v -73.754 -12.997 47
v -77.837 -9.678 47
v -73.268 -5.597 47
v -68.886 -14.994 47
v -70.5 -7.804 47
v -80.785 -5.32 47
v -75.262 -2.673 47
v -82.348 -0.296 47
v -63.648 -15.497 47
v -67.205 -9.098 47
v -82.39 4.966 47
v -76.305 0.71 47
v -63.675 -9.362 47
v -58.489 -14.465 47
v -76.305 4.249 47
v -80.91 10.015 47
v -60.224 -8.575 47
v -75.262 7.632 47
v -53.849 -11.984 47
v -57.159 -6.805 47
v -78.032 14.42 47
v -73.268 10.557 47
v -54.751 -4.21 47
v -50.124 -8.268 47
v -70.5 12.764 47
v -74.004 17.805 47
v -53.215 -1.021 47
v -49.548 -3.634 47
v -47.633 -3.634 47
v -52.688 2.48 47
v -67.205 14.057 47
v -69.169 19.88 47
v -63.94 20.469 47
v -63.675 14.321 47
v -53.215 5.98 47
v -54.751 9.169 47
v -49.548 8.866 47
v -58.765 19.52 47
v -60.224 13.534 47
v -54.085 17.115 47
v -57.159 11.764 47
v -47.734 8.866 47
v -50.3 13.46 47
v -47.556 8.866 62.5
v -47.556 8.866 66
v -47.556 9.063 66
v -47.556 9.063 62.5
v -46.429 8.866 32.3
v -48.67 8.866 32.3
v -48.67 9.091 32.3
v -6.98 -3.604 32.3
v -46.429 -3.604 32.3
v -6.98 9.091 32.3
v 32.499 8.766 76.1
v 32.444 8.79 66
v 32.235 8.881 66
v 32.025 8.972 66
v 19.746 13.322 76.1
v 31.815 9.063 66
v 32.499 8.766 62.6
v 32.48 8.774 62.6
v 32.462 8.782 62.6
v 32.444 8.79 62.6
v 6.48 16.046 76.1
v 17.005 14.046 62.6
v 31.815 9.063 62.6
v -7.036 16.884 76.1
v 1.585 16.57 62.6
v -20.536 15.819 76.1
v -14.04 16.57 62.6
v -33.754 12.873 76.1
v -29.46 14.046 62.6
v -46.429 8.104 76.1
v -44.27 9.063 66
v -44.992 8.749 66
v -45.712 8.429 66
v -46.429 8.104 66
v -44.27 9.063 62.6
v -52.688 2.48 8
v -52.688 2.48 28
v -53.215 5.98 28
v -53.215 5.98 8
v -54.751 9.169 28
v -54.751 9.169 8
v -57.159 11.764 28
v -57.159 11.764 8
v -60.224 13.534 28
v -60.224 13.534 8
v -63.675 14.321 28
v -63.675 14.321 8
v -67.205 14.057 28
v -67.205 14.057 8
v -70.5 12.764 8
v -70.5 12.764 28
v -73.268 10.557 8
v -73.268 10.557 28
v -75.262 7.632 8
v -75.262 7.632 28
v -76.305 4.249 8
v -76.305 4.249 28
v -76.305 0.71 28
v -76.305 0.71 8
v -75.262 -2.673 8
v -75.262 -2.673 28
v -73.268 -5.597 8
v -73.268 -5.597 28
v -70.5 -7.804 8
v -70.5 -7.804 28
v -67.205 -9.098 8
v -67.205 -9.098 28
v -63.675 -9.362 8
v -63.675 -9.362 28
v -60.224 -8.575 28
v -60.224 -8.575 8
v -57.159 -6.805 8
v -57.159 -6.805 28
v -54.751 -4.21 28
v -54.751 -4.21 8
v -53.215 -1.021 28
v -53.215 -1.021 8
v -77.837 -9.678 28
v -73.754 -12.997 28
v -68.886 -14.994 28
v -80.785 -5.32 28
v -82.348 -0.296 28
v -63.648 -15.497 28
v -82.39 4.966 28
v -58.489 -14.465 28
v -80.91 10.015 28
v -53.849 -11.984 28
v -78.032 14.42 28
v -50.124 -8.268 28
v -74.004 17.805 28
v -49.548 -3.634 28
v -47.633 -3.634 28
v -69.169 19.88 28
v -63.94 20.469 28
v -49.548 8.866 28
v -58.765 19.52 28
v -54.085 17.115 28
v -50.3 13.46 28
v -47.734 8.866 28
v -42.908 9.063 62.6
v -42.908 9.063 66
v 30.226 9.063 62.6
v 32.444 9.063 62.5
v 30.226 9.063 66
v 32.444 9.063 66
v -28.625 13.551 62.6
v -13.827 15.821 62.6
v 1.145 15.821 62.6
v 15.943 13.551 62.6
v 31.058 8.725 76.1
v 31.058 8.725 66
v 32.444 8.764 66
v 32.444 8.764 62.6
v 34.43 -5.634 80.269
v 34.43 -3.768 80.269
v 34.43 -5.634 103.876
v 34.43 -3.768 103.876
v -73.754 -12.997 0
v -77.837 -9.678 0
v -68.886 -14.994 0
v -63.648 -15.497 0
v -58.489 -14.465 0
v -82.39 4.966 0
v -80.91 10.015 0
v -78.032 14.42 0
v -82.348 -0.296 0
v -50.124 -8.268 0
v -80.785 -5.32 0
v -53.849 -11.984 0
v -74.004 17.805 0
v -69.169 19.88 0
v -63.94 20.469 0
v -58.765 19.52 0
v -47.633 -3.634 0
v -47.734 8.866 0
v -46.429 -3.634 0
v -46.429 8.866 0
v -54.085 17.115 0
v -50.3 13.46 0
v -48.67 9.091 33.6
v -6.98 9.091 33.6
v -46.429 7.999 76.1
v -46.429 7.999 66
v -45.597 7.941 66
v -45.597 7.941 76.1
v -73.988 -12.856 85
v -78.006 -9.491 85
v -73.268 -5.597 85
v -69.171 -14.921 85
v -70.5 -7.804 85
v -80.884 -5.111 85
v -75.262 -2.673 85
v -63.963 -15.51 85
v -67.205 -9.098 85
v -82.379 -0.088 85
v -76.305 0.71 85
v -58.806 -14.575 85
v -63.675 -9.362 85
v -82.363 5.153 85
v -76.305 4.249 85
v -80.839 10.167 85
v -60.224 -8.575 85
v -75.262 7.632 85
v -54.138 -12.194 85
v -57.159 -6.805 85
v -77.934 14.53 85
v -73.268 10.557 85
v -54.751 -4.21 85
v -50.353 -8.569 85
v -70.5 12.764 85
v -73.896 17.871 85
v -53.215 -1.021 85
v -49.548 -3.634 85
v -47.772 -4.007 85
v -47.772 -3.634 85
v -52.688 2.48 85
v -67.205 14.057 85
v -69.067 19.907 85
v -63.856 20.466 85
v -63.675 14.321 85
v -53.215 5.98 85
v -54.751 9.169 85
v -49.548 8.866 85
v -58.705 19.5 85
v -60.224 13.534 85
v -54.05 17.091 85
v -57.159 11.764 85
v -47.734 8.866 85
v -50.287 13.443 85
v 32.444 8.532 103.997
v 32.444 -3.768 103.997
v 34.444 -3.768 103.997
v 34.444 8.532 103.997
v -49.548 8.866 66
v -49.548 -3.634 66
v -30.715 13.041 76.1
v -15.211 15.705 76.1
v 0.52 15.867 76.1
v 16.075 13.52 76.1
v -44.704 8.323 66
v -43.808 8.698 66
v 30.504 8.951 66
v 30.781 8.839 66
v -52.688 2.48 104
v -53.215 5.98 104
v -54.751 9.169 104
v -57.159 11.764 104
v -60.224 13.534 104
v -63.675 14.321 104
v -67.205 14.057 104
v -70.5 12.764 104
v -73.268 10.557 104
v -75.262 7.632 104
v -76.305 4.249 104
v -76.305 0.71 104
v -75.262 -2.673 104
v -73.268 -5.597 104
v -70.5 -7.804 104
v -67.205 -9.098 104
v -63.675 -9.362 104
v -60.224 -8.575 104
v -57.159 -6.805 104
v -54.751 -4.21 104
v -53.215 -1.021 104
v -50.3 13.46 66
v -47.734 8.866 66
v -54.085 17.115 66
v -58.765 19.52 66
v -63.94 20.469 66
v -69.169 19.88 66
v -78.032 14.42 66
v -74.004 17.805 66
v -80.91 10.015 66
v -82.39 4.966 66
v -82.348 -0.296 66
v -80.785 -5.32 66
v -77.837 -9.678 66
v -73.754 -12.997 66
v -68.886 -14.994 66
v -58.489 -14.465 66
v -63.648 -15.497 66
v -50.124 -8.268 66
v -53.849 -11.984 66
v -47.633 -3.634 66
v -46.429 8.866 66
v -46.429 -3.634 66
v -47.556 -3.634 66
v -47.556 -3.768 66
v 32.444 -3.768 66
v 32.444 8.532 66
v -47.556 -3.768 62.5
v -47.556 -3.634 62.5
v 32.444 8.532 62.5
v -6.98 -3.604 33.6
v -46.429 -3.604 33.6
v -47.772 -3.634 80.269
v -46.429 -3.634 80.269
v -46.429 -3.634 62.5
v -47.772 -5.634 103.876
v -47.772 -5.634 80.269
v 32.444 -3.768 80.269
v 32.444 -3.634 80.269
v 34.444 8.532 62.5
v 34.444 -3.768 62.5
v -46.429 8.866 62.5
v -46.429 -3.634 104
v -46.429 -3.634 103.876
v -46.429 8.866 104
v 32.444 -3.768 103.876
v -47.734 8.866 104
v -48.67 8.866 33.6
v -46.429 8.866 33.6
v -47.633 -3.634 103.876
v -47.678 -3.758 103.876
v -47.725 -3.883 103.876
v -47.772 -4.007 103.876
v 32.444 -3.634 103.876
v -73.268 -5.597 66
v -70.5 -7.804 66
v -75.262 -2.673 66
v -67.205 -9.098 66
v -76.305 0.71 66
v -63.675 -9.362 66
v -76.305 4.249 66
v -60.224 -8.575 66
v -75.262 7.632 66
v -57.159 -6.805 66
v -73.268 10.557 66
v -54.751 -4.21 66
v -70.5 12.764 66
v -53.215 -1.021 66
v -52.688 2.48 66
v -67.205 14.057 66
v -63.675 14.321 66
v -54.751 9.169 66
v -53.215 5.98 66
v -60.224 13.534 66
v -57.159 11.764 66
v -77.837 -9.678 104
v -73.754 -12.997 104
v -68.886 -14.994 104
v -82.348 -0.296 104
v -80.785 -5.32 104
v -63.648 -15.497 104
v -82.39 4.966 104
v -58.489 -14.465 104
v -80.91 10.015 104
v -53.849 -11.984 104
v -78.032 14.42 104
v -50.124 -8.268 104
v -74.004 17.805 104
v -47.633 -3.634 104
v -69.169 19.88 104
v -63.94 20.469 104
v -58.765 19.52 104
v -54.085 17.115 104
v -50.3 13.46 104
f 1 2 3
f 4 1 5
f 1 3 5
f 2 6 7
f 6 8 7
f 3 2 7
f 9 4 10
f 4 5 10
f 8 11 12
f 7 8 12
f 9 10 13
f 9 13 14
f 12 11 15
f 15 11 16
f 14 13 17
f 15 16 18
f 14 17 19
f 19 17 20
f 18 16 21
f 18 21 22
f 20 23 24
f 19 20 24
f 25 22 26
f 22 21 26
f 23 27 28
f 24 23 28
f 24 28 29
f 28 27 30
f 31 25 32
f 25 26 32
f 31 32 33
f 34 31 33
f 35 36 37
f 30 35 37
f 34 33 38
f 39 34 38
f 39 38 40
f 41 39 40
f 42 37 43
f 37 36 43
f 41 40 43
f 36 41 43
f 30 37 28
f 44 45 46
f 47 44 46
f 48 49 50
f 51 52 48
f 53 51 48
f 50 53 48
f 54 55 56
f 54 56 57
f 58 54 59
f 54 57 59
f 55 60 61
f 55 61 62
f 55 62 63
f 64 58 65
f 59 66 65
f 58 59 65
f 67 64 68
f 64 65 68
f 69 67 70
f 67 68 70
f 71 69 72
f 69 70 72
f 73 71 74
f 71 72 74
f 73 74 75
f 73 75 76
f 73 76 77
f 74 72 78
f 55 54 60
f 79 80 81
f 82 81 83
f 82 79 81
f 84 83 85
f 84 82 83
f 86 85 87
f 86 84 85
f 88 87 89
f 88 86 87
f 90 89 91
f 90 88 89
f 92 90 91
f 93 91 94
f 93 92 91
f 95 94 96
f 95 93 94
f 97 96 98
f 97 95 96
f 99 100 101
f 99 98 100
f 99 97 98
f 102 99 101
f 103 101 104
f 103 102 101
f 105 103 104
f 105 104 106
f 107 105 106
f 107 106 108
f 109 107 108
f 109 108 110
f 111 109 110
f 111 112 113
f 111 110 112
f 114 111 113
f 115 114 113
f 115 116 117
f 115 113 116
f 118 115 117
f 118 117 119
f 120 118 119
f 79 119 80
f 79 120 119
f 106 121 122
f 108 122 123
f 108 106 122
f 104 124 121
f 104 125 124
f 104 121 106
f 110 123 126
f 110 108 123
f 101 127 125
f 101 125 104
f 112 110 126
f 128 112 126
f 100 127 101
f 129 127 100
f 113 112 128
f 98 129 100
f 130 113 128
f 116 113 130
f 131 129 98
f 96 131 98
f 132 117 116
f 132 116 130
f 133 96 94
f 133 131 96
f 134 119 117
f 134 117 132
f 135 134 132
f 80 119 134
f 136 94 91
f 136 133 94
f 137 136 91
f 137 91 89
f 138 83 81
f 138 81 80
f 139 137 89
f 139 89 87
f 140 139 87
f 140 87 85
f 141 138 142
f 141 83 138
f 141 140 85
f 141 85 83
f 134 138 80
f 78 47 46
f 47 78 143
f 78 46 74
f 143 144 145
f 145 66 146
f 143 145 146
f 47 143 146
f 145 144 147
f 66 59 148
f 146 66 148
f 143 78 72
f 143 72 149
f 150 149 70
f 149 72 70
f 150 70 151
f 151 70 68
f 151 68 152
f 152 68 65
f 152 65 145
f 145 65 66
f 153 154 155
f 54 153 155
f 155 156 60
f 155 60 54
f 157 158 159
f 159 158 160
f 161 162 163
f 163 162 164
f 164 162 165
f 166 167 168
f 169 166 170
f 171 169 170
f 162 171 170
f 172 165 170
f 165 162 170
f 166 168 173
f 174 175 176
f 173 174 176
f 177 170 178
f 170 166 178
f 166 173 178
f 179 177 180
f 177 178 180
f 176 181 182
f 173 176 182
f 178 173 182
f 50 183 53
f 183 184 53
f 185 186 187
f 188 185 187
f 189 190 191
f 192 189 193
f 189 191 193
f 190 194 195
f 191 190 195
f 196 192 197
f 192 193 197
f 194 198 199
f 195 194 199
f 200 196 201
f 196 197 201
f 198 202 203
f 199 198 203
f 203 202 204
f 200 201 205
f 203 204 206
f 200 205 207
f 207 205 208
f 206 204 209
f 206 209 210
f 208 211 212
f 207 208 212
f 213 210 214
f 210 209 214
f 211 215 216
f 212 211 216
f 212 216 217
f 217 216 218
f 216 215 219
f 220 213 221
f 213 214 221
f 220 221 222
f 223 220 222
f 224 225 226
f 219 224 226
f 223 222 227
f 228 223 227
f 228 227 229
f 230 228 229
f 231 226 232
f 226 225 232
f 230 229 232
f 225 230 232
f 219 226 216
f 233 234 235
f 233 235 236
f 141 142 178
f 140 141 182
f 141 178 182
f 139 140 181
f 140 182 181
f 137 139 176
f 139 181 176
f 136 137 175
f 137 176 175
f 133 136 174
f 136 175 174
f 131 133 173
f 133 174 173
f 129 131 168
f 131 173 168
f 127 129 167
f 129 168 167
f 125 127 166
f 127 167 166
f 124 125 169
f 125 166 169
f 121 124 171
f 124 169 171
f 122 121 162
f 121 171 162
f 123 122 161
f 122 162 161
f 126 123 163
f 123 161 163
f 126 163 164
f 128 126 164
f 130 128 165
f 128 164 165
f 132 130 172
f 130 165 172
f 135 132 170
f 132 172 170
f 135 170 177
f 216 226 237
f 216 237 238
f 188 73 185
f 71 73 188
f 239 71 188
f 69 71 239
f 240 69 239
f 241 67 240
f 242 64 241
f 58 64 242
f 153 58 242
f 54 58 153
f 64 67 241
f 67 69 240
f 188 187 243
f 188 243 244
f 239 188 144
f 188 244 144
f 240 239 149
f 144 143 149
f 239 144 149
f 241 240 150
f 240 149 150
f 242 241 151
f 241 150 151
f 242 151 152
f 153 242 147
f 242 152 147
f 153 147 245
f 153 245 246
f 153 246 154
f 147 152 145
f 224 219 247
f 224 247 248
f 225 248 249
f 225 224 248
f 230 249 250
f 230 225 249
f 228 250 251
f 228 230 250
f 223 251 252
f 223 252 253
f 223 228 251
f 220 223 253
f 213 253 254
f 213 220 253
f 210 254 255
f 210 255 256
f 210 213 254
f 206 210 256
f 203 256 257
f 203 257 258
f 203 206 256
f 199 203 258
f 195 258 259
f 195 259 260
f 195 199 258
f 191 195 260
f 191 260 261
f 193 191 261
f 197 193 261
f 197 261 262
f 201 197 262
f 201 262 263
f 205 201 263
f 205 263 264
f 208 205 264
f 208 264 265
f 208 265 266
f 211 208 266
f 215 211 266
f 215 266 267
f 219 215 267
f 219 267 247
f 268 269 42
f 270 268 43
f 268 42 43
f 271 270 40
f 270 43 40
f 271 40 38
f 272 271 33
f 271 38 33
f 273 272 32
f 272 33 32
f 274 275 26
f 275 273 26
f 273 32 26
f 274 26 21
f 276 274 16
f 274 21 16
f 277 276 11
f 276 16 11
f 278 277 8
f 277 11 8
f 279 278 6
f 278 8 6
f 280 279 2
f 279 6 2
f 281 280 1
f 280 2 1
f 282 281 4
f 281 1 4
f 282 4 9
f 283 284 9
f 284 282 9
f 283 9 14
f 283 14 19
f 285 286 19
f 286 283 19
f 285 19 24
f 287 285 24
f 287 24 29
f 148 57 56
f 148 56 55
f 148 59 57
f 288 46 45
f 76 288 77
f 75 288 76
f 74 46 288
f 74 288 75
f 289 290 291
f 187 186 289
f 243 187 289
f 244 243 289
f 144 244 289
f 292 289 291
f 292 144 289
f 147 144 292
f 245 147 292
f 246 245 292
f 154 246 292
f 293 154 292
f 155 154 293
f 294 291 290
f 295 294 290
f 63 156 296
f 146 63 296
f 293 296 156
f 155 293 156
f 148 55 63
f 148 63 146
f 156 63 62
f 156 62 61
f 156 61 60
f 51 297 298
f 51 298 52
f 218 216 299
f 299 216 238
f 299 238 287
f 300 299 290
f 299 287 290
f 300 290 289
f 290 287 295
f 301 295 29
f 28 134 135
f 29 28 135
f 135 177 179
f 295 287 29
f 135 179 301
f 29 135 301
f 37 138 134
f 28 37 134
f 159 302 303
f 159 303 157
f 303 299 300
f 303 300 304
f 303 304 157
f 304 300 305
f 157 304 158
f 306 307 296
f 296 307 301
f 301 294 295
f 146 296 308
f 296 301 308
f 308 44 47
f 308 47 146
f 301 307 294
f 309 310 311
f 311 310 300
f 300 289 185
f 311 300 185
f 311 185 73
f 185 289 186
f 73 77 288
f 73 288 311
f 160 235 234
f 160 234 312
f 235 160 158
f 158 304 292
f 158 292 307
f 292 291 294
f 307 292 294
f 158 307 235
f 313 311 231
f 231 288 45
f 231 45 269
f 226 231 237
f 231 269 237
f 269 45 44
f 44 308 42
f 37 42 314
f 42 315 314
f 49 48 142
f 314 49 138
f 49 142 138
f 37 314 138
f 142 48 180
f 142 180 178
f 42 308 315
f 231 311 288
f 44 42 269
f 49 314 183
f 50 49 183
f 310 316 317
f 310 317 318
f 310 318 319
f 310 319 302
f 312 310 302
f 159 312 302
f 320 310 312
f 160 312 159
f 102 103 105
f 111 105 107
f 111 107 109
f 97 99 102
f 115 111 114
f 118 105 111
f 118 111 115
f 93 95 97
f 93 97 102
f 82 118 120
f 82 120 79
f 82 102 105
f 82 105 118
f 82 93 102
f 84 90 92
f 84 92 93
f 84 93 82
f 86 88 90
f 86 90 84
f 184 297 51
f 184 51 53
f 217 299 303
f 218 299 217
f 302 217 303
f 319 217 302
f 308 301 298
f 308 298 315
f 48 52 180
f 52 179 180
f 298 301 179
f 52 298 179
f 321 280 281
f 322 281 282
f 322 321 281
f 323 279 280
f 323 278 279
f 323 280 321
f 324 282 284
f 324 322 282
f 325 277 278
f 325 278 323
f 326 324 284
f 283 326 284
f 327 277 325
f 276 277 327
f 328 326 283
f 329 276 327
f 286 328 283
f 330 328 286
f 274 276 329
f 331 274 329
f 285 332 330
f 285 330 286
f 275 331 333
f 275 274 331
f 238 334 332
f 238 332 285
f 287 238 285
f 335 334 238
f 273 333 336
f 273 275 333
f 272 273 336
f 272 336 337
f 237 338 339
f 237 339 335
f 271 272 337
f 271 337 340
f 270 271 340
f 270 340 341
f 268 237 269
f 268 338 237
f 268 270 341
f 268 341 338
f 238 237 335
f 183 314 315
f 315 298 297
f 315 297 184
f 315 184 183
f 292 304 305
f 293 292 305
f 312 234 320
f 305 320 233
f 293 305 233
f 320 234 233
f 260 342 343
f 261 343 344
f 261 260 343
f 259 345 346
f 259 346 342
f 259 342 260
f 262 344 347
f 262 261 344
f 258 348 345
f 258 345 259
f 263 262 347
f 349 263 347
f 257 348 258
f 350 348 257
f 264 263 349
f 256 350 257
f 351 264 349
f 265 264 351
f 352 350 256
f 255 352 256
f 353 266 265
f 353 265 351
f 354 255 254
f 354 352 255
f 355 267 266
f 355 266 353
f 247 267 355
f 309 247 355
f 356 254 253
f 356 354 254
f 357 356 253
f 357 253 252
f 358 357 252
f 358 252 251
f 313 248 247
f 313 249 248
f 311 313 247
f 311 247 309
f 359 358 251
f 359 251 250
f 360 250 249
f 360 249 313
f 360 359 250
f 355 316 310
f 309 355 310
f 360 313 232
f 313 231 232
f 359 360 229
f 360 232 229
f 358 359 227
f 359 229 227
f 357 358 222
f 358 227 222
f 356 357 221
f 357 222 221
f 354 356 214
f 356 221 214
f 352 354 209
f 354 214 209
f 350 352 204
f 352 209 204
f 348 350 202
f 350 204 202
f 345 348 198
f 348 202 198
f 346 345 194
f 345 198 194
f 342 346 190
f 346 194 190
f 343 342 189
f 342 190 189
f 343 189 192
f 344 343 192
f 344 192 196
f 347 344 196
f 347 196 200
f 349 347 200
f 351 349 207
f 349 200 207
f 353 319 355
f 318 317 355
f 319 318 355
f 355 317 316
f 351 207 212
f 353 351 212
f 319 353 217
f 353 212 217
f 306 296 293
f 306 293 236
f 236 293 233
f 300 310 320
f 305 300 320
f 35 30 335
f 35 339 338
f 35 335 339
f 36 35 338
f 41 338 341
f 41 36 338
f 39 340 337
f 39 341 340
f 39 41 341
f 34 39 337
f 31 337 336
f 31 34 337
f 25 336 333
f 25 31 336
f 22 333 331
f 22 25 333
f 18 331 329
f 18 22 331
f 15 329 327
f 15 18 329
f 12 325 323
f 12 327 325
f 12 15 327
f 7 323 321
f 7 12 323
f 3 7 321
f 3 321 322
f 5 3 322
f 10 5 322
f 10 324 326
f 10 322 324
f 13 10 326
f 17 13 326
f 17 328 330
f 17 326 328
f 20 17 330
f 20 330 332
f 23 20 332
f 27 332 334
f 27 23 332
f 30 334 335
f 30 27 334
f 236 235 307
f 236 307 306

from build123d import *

# Parameters (mm, degrees)
F0_R      = 18
F1_DEPTH  = 8
F2_R      = 18
F2_R_2    = 11.875
F3_DEPTH  = 96
F7_W      = 114.2527745105
F7_H      = 71.0478108376
F8_DEPTH  = 19
F9_W      = 142.8963663056
F9_H      = 89.3513672054
F10_DEPTH = 19
F12_DEPTH = 104
F14_W     = 80
F14_H     = 12.8310857864
F15_DEPTH = 3.5
F16_W     = 12.3001844622
F16_H     = 37.9971187711
F16_H_2   = 3.5
F17_DEPTH = 2
F18_W     = 82.2026617825
F18_H     = 23.6075371504
F19_DEPTH = 2
F22_DEPTH = 13.5
F24_W     = 39.2900933512
F24_H     = 12.6941720955
F25_DEPTH = 1.3
F26_DEPTH = 2.4


with BuildPart() as f1:
    # F0 (on Top) → F1 (new body)
    with BuildSketch(Plane.XY):
        with Locations((-64.5627826452, 2.4795725476)):
            Circle(F0_R)
    extrude(amount=F1_DEPTH)

    # F2 (on face) → F3 (join)
    with BuildSketch(Plane.XY.offset(8)):
        with Locations((-64.5627826452, 2.4795725476)):
            Circle(F2_R)
        with Locations((-64.5627826452, 2.4795725476)):
            Circle(F2_R_2, mode=Mode.SUBTRACT)
    extrude(amount=F3_DEPTH)

    # F7 (on offset) → F8 (cut)
    with BuildSketch(Plane.XY.offset(66)):
        with Locations((-59.9692843389, 7.8492248431)):
            Rectangle(F7_W, F7_H)
    extrude(amount=F8_DEPTH, mode=Mode.SUBTRACT)

    # F9 (on offset) → F10 (cut)
    with BuildSketch(Plane.XY.offset(47)):
        with Locations((-63.3265613578, 3.715576604)):
            Rectangle(F9_W, F9_H)
    extrude(amount=-F10_DEPTH, mode=Mode.SUBTRACT)

    # F11 (on Top) → F12 (join)
    with BuildSketch(Plane.XY):
        Polygon((-46.4286282659, 8.8664737705), (-47.033398658, 8.8664737705), (-49.5477505028, 8.8664737705), (-49.5477505028, -3.6335218174), (-47.033398658, -3.6335218174), (-46.4286282659, -3.6335218174), align=None)
    extrude(amount=F12_DEPTH)

    # F14 (on offset) → F15 (join)
    with BuildSketch(Plane.XY.offset(66)):
        with Locations((-7.5557883829, 2.6472329628)):
            Rectangle(F14_W, F14_H)
    extrude(amount=-F15_DEPTH)

    # F16 (on face) → F17 (join)
    with BuildSketch(Plane.YZ.offset(32.4442116171)):
        with Locations((2.3817823007, 84.9985593855)):
            Rectangle(F16_W, F16_H)
        with Locations((2.3817823007, 64.25)):
            Rectangle(F16_W, F16_H_2)
    extrude(amount=F17_DEPTH)

    # F18 (on face) → F19 (join)
    with BuildSketch(Plane.XZ.offset(3.6335218174)):
        with Locations((-6.6709686071, 92.0722857118)):
            Rectangle(F18_W, F18_H)
    extrude(amount=F19_DEPTH)

    # F21 (on offset) → F22 (join)
    with BuildSketch(Plane.XY.offset(62.6)):
        with BuildLine():
            Line((31.0583338141, 8.7254531682), (32.4985198677, 8.7659778073))
            ThreePointArc((32.4985198677, 8.7659778073), (-7.1450361543, 16.8829381262), (-46.6268882155, 8.0127669498))
            Line((-46.6268882155, 8.0127669498), (-45.5970168114, 7.9405866563))
            ThreePointArc((-45.5970168114, 7.9405866563), (-7.3488744174, 16.1007405169), (31.0583338141, 8.7254531682))
        make_face()
    extrude(amount=F22_DEPTH)



with BuildPart() as f25:
    # F24 (on offset) → F25 (new body)
    with BuildSketch(Plane.XY.offset(33.6)):
        with Locations((-26.6252344009, 2.7435675729)):
            Rectangle(F24_W, F24_H)
    extrude(amount=-F25_DEPTH)


with BuildPart() as f1_1:
    add(f1.part)
    # F26 (add): a face of the model
    f26_faces = [f25.part.faces().sort_by_distance(p)[0] for p in [
        (-46.2702810764, 2.7435675729, 32.95),
    ]]

    add(f25.part)  # F26 merges F25
    extrude(f26_faces, amount=F26_DEPTH)


solid = f1_1.part
